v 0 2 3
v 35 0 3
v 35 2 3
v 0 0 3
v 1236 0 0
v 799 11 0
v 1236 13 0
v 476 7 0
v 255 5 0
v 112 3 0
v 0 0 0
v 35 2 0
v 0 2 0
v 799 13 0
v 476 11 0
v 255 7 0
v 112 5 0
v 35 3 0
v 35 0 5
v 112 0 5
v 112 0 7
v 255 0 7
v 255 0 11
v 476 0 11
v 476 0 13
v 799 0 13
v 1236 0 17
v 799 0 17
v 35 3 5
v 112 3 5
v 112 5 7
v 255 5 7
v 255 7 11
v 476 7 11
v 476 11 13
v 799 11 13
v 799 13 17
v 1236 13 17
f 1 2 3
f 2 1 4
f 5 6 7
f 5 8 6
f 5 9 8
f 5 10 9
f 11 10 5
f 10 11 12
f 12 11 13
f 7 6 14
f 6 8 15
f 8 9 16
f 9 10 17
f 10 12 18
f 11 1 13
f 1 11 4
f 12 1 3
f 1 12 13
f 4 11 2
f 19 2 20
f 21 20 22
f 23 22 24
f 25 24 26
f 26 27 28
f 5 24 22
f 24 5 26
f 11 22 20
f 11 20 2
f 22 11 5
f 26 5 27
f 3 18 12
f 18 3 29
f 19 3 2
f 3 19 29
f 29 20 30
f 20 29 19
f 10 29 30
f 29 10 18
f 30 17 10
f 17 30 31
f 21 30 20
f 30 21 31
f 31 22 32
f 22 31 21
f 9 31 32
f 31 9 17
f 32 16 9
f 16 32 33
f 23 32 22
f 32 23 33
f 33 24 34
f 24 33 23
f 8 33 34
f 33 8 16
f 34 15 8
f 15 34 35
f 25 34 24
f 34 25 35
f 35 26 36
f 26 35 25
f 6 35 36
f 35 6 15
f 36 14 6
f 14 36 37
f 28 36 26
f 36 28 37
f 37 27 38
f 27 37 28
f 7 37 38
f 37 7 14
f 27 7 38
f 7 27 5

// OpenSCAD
translate([2.5, 1.0, 1.5]) color([0.6785713567893591, 0.805109989032137, 0.7578463822613826]) cube([5, 2, 3], center=true);
translate([7.5, 1.0, 1.5]) color([0.9905325627055622, 0.7469653891501328, 0.9057807233528663]) cube([5, 2, 3], center=true);
translate([12.5, 1.0, 1.5]) color([0.20610483206558328, 0.535416304328581, 0.5986142636674691]) cube([5, 2, 3], center=true);
translate([17.5, 1.0, 1.5]) color([0.8256966171603538, 0.4822135630659161, 0.7910402117090956]) cube([5, 2, 3], center=true);
translate([22.5, 1.0, 1.5]) color([0.3885688901501142, 0.5863884555814496, 0.8513166074810679]) cube([5, 2, 3], center=true);
translate([27.5, 1.0, 1.5]) color([0.7980594711041583, 0.6569845518861341, 0.00024069652516689466]) cube([5, 2, 3], center=true);
translate([32.5, 1.0, 1.5]) color([0.18196892218621108, 0.5068577868511277, 0.2544593984833793]) cube([5, 2, 3], center=true);
translate([38.5, 1.5, 2.5]) color([0.06562084327273077, 0.8598834221214616, 0.9429470213131631]) cube([7, 3, 5], center=true);
translate([45.5, 1.5, 2.5]) color([0.3028048781490337, 0.40807316738486077, 0.8100375338172869]) cube([7, 3, 5], center=true);
translate([52.5, 1.5, 2.5]) color([0.06225875887122312, 0.6409848625624502, 0.12732081293278708]) cube([7, 3, 5], center=true);
translate([59.5, 1.5, 2.5]) color([0.2870883399952252, 0.829940686628406, 0.0555270458896614]) cube([7, 3, 5], center=true);
translate([66.5, 1.5, 2.5]) color([0.035933833430188966, 0.4178660447962945, 0.49183095909626395]) cube([7, 3, 5], center=true);
translate([73.5, 1.5, 2.5]) color([0.8633251831082008, 0.7171887463451895, 0.6735438085995347]) cube([7, 3, 5], center=true);
translate([80.5, 1.5, 2.5]) color([0.15137377239978678, 0.9867059242186832, 0.41114019628748133]) cube([7, 3, 5], center=true);
translate([87.5, 1.5, 2.5]) color([0.6117708643248599, 0.38668300553323576, 0.04703291581184044]) cube([7, 3, 5], center=true);
translate([94.5, 1.5, 2.5]) color([0.4708892090480652, 0.15136775389483625, 0.03246546237394399]) cube([7, 3, 5], center=true);
translate([101.5, 1.5, 2.5]) color([0.6174004236810055, 0.6299662912183356, 0.10529282465636491]) cube([7, 3, 5], center=true);
translate([108.5, 1.5, 2.5]) color([0.5491437662317772, 0.3466679766399683, 0.3834140731648874]) cube([7, 3, 5], center=true);
translate([117.5, 2.5, 3.5]) color([0.7764198986996783, 0.49031967752424566, 0.8812766154122413]) cube([11, 5, 7], center=true);
translate([128.5, 2.5, 3.5]) color([0.6101197429062234, 0.4671884150380703, 0.6323126400553846]) cube([11, 5, 7], center=true);
translate([139.5, 2.5, 3.5]) color([0.3378653798287524, 0.12432379252825243, 0.6825296186925238]) cube([11, 5, 7], center=true);
translate([150.5, 2.5, 3.5]) color([0.622037442746657, 0.7885664913738635, 0.1271091249471088]) cube([11, 5, 7], center=true);
translate([161.5, 2.5, 3.5]) color([0.9117833181295222, 0.799341211421814, 0.9168874080910093]) cube([11, 5, 7], center=true);
translate([172.5, 2.5, 3.5]) color([0.8725347217734669, 0.681006446357057, 0.8102508494373589]) cube([11, 5, 7], center=true);
translate([183.5, 2.5, 3.5]) color([0.5190073092314018, 0.7854891493606652, 0.18912746785718504]) cube([11, 5, 7], center=true);
translate([194.5, 2.5, 3.5]) color([0.7821141063572942, 0.44457960405634067, 0.756616221297365]) cube([11, 5, 7], center=true);
translate([205.5, 2.5, 3.5]) color([0.4554702368121878, 0.7895587282777832, 0.07533958521856021]) cube([11, 5, 7], center=true);
translate([216.5, 2.5, 3.5]) color([0.04464090542441246, 0.9342895823715677, 0.4861651007487351]) cube([11, 5, 7], center=true);
translate([227.5, 2.5, 3.5]) color([0.9010713996489047, 0.9447832518820701, 0.6665111524556335]) cube([11, 5, 7], center=true);
translate([238.5, 2.5, 3.5]) color([0.5717968260934746, 0.21597938410680917, 0.09347621929900818]) cube([11, 5, 7], center=true);
translate([249.5, 2.5, 3.5]) color([0.8193942150822732, 0.8887720676319878, 0.7793957106948857]) cube([11, 5, 7], center=true);
translate([261.5, 3.5, 5.5]) color([0.6985024327316249, 0.42011111607482077, 0.3053115900269564]) cube([13, 7, 11], center=true);
translate([274.5, 3.5, 5.5]) color([0.11344489563770899, 0.425970248072163, 0.5660129742477574]) cube([13, 7, 11], center=true);
translate([287.5, 3.5, 5.5]) color([0.9228805831375125, 0.9357547693309531, 0.41564119654091314]) cube([13, 7, 11], center=true);
translate([300.5, 3.5, 5.5]) color([0.0992109880980957, 0.7738187324714434, 0.7342793416571158]) cube([13, 7, 11], center=true);
translate([313.5, 3.5, 5.5]) color([0.03070084595190614, 0.4467185991338365, 0.6864181042985581]) cube([13, 7, 11], center=true);
translate([326.5, 3.5, 5.5]) color([0.030134234552269934, 0.9192823534016137, 0.9622424865104192]) cube([13, 7, 11], center=true);
translate([339.5, 3.5, 5.5]) color([0.72254277208884, 0.0785385396518038, 0.07032946587635569]) cube([13, 7, 11], center=true);
translate([352.5, 3.5, 5.5]) color([0.3592533148212369, 0.029377507756986443, 0.3478777272843395]) cube([13, 7, 11], center=true);
translate([365.5, 3.5, 5.5]) color([0.009964241312966027, 0.9743235128409679, 0.8190066990688627]) cube([13, 7, 11], center=true);
translate([378.5, 3.5, 5.5]) color([0.07051761147818736, 0.8934350918478603, 0.20797804000401565]) cube([13, 7, 11], center=true);
translate([391.5, 3.5, 5.5]) color([0.20479079826934998, 0.6737591455288341, 0.9382622681625481]) cube([13, 7, 11], center=true);
translate([404.5, 3.5, 5.5]) color([0.12318812122923739, 0.007184567252270457, 0.3691301471700257]) cube([13, 7, 11], center=true);
translate([417.5, 3.5, 5.5]) color([0.024650014436155776, 0.6048482375805311, 0.8591756086192088]) cube([13, 7, 11], center=true);
translate([430.5, 3.5, 5.5]) color([0.1869917024228578, 0.11239103583018406, 0.34444960733861085]) cube([13, 7, 11], center=true);
translate([443.5, 3.5, 5.5]) color([0.9591715206073138, 0.13015769442868408, 0.9665192604669938]) cube([13, 7, 11], center=true);
translate([456.5, 3.5, 5.5]) color([0.36223986994484925, 0.47337040276011155, 0.29263198596497353]) cube([13, 7, 11], center=true);
translate([469.5, 3.5, 5.5]) color([0.9371268442154698, 0.9581478949874975, 0.6359157065077434]) cube([13, 7, 11], center=true);
translate([484.5, 5.5, 6.5]) color([0.18404555017515556, 0.9929517886102871, 0.10258043954691198]) cube([17, 11, 13], center=true);
translate([501.5, 5.5, 6.5]) color([0.5808493815940804, 0.15640306008300875, 0.8976753141502056]) cube([17, 11, 13], center=true);
translate([518.5, 5.5, 6.5]) color([0.9456783914956152, 0.8043902980001079, 0.3158914186681244]) cube([17, 11, 13], center=true);
translate([535.5, 5.5, 6.5]) color([0.2428386899579852, 0.7548584132190378, 0.291059519145354]) cube([17, 11, 13], center=true);
translate([552.5, 5.5, 6.5]) color([0.4197853778540753, 0.04625567690264132, 0.13223381043380655]) cube([17, 11, 13], center=true);
translate([569.5, 5.5, 6.5]) color([0.020549620641776678, 0.0779211200935358, 0.07321114936486084]) cube([17, 11, 13], center=true);
translate([586.5, 5.5, 6.5]) color([0.42023170217414685, 0.5507771776374378, 0.740878819870922]) cube([17, 11, 13], center=true);
translate([603.5, 5.5, 6.5]) color([0.14228347384241602, 0.4221887461694188, 0.6369660374117204]) cube([17, 11, 13], center=true);
translate([620.5, 5.5, 6.5]) color([0.08455569481893255, 0.44481115514620384, 0.3692560392397978]) cube([17, 11, 13], center=true);
translate([637.5, 5.5, 6.5]) color([0.9489319289416618, 0.05785711390101722, 0.40862622118314806]) cube([17, 11, 13], center=true);
translate([654.5, 5.5, 6.5]) color([0.41722547979620506, 0.728180504599678, 0.3206710028745039]) cube([17, 11, 13], center=true);
translate([671.5, 5.5, 6.5]) color([0.20399027594623398, 0.2933116551663051, 0.4708875424493587]) cube([17, 11, 13], center=true);
translate([688.5, 5.5, 6.5]) color([0.9502683295716211, 0.7965170227633064, 0.2769702457797433]) cube([17, 11, 13], center=true);
translate([705.5, 5.5, 6.5]) color([0.5581815883930463, 0.6882003035685332, 0.7956571556821322]) cube([17, 11, 13], center=true);
translate([722.5, 5.5, 6.5]) color([0.4461643839498476, 0.398776905129706, 0.7676407428212785]) cube([17, 11, 13], center=true);
translate([739.5, 5.5, 6.5]) color([0.43171649556411207, 0.2479576688970051, 0.4534470315306477]) cube([17, 11, 13], center=true);
translate([756.5, 5.5, 6.5]) color([0.9371046462904561, 0.14256748821860132, 0.4624353545272121]) cube([17, 11, 13], center=true);
translate([773.5, 5.5, 6.5]) color([0.6373035243637815, 0.48328798826810027, 0.20363990437036994]) cube([17, 11, 13], center=true);
translate([790.5, 5.5, 6.5]) color([0.0018431606156659175, 0.698991711803439, 0.6187355180234525]) cube([17, 11, 13], center=true);
translate([808.5, 6.5, 8.5]) color([0.007776649435864202, 0.2985601210181208, 0.7686342595428415]) cube([19, 13, 17], center=true);
translate([827.5, 6.5, 8.5]) color([0.6289203785446209, 0.5452081159439722, 0.1562211098090489]) cube([19, 13, 17], center=true);
translate([846.5, 6.5, 8.5]) color([0.7062940429996885, 0.4714349217158037, 0.6781787462359636]) cube([19, 13, 17], center=true);
translate([865.5, 6.5, 8.5]) color([0.7600898367234922, 0.23236272144124515, 0.7619950130977117]) cube([19, 13, 17], center=true);
translate([884.5, 6.5, 8.5]) color([0.28008838468838926, 0.9840151371182455, 0.12083161078451865]) cube([19, 13, 17], center=true);
translate([903.5, 6.5, 8.5]) color([0.8837180187440564, 0.040547125043371324, 0.256575818348144]) cube([19, 13, 17], center=true);
translate([922.5, 6.5, 8.5]) color([0.5261019087624684, 0.5816161834445946, 0.3962349850280922]) cube([19, 13, 17], center=true);
translate([941.5, 6.5, 8.5]) color([0.10203172822707107, 0.2526080858247133, 0.28339650386048865]) cube([19, 13, 17], center=true);
translate([960.5, 6.5, 8.5]) color([0.7552228545587315, 0.9087743252220071, 0.5954099154864194]) cube([19, 13, 17], center=true);
translate([979.5, 6.5, 8.5]) color([0.03545096569102746, 0.7922364716417103, 0.30560393283991993]) cube([19, 13, 17], center=true);
translate([998.5, 6.5, 8.5]) color([0.33989040641624346, 0.5301854376454147, 0.24904704757555507]) cube([19, 13, 17], center=true);
translate([1017.5, 6.5, 8.5]) color([0.9199780878573697, 0.1635547583408129, 0.41483040050373277]) cube([19, 13, 17], center=true);
translate([1036.5, 6.5, 8.5]) color([0.2896919495072058, 0.5198341022016146, 0.5739818030823766]) cube([19, 13, 17], center=true);
translate([1055.5, 6.5, 8.5]) color([0.6271396891048426, 0.5313758038379728, 0.4108045023355995]) cube([19, 13, 17], center=true);
translate([1074.5, 6.5, 8.5]) color([0.634594012376466, 0.40341287658681757, 0.7785502590540477]) cube([19, 13, 17], center=true);
translate([1093.5, 6.5, 8.5]) color([0.7881774252549901, 0.29225416811082217, 0.37180432355577453]) cube([19, 13, 17], center=true);
translate([1112.5, 6.5, 8.5]) color([0.6288109059468862, 0.15706996711565713, 0.6970319309869248]) cube([19, 13, 17], center=true);
translate([1131.5, 6.5, 8.5]) color([0.3814277529807131, 0.591062474757007, 0.1395330992312218]) cube([19, 13, 17], center=true);
translate([1150.5, 6.5, 8.5]) color([0.6682583860975598, 0.3540578606136997, 0.4726655762072315]) cube([19, 13, 17], center=true);
translate([1169.5, 6.5, 8.5]) color([0.4151074008495357, 0.47671524799509457, 0.6946956329164442]) cube([19, 13, 17], center=true);
translate([1188.5, 6.5, 8.5]) color([0.31824017683207795, 0.6520544808985483, 0.060222107499701916]) cube([19, 13, 17], center=true);
translate([1207.5, 6.5, 8.5]) color([0.3001851524622099, 0.7452096901500458, 0.05240587806206365]) cube([19, 13, 17], center=true);
translate([1226.5, 6.5, 8.5]) color([0.6211421952822352, 0.025546799267838538, 0.4715288683099005]) cube([19, 13, 17], center=true);
